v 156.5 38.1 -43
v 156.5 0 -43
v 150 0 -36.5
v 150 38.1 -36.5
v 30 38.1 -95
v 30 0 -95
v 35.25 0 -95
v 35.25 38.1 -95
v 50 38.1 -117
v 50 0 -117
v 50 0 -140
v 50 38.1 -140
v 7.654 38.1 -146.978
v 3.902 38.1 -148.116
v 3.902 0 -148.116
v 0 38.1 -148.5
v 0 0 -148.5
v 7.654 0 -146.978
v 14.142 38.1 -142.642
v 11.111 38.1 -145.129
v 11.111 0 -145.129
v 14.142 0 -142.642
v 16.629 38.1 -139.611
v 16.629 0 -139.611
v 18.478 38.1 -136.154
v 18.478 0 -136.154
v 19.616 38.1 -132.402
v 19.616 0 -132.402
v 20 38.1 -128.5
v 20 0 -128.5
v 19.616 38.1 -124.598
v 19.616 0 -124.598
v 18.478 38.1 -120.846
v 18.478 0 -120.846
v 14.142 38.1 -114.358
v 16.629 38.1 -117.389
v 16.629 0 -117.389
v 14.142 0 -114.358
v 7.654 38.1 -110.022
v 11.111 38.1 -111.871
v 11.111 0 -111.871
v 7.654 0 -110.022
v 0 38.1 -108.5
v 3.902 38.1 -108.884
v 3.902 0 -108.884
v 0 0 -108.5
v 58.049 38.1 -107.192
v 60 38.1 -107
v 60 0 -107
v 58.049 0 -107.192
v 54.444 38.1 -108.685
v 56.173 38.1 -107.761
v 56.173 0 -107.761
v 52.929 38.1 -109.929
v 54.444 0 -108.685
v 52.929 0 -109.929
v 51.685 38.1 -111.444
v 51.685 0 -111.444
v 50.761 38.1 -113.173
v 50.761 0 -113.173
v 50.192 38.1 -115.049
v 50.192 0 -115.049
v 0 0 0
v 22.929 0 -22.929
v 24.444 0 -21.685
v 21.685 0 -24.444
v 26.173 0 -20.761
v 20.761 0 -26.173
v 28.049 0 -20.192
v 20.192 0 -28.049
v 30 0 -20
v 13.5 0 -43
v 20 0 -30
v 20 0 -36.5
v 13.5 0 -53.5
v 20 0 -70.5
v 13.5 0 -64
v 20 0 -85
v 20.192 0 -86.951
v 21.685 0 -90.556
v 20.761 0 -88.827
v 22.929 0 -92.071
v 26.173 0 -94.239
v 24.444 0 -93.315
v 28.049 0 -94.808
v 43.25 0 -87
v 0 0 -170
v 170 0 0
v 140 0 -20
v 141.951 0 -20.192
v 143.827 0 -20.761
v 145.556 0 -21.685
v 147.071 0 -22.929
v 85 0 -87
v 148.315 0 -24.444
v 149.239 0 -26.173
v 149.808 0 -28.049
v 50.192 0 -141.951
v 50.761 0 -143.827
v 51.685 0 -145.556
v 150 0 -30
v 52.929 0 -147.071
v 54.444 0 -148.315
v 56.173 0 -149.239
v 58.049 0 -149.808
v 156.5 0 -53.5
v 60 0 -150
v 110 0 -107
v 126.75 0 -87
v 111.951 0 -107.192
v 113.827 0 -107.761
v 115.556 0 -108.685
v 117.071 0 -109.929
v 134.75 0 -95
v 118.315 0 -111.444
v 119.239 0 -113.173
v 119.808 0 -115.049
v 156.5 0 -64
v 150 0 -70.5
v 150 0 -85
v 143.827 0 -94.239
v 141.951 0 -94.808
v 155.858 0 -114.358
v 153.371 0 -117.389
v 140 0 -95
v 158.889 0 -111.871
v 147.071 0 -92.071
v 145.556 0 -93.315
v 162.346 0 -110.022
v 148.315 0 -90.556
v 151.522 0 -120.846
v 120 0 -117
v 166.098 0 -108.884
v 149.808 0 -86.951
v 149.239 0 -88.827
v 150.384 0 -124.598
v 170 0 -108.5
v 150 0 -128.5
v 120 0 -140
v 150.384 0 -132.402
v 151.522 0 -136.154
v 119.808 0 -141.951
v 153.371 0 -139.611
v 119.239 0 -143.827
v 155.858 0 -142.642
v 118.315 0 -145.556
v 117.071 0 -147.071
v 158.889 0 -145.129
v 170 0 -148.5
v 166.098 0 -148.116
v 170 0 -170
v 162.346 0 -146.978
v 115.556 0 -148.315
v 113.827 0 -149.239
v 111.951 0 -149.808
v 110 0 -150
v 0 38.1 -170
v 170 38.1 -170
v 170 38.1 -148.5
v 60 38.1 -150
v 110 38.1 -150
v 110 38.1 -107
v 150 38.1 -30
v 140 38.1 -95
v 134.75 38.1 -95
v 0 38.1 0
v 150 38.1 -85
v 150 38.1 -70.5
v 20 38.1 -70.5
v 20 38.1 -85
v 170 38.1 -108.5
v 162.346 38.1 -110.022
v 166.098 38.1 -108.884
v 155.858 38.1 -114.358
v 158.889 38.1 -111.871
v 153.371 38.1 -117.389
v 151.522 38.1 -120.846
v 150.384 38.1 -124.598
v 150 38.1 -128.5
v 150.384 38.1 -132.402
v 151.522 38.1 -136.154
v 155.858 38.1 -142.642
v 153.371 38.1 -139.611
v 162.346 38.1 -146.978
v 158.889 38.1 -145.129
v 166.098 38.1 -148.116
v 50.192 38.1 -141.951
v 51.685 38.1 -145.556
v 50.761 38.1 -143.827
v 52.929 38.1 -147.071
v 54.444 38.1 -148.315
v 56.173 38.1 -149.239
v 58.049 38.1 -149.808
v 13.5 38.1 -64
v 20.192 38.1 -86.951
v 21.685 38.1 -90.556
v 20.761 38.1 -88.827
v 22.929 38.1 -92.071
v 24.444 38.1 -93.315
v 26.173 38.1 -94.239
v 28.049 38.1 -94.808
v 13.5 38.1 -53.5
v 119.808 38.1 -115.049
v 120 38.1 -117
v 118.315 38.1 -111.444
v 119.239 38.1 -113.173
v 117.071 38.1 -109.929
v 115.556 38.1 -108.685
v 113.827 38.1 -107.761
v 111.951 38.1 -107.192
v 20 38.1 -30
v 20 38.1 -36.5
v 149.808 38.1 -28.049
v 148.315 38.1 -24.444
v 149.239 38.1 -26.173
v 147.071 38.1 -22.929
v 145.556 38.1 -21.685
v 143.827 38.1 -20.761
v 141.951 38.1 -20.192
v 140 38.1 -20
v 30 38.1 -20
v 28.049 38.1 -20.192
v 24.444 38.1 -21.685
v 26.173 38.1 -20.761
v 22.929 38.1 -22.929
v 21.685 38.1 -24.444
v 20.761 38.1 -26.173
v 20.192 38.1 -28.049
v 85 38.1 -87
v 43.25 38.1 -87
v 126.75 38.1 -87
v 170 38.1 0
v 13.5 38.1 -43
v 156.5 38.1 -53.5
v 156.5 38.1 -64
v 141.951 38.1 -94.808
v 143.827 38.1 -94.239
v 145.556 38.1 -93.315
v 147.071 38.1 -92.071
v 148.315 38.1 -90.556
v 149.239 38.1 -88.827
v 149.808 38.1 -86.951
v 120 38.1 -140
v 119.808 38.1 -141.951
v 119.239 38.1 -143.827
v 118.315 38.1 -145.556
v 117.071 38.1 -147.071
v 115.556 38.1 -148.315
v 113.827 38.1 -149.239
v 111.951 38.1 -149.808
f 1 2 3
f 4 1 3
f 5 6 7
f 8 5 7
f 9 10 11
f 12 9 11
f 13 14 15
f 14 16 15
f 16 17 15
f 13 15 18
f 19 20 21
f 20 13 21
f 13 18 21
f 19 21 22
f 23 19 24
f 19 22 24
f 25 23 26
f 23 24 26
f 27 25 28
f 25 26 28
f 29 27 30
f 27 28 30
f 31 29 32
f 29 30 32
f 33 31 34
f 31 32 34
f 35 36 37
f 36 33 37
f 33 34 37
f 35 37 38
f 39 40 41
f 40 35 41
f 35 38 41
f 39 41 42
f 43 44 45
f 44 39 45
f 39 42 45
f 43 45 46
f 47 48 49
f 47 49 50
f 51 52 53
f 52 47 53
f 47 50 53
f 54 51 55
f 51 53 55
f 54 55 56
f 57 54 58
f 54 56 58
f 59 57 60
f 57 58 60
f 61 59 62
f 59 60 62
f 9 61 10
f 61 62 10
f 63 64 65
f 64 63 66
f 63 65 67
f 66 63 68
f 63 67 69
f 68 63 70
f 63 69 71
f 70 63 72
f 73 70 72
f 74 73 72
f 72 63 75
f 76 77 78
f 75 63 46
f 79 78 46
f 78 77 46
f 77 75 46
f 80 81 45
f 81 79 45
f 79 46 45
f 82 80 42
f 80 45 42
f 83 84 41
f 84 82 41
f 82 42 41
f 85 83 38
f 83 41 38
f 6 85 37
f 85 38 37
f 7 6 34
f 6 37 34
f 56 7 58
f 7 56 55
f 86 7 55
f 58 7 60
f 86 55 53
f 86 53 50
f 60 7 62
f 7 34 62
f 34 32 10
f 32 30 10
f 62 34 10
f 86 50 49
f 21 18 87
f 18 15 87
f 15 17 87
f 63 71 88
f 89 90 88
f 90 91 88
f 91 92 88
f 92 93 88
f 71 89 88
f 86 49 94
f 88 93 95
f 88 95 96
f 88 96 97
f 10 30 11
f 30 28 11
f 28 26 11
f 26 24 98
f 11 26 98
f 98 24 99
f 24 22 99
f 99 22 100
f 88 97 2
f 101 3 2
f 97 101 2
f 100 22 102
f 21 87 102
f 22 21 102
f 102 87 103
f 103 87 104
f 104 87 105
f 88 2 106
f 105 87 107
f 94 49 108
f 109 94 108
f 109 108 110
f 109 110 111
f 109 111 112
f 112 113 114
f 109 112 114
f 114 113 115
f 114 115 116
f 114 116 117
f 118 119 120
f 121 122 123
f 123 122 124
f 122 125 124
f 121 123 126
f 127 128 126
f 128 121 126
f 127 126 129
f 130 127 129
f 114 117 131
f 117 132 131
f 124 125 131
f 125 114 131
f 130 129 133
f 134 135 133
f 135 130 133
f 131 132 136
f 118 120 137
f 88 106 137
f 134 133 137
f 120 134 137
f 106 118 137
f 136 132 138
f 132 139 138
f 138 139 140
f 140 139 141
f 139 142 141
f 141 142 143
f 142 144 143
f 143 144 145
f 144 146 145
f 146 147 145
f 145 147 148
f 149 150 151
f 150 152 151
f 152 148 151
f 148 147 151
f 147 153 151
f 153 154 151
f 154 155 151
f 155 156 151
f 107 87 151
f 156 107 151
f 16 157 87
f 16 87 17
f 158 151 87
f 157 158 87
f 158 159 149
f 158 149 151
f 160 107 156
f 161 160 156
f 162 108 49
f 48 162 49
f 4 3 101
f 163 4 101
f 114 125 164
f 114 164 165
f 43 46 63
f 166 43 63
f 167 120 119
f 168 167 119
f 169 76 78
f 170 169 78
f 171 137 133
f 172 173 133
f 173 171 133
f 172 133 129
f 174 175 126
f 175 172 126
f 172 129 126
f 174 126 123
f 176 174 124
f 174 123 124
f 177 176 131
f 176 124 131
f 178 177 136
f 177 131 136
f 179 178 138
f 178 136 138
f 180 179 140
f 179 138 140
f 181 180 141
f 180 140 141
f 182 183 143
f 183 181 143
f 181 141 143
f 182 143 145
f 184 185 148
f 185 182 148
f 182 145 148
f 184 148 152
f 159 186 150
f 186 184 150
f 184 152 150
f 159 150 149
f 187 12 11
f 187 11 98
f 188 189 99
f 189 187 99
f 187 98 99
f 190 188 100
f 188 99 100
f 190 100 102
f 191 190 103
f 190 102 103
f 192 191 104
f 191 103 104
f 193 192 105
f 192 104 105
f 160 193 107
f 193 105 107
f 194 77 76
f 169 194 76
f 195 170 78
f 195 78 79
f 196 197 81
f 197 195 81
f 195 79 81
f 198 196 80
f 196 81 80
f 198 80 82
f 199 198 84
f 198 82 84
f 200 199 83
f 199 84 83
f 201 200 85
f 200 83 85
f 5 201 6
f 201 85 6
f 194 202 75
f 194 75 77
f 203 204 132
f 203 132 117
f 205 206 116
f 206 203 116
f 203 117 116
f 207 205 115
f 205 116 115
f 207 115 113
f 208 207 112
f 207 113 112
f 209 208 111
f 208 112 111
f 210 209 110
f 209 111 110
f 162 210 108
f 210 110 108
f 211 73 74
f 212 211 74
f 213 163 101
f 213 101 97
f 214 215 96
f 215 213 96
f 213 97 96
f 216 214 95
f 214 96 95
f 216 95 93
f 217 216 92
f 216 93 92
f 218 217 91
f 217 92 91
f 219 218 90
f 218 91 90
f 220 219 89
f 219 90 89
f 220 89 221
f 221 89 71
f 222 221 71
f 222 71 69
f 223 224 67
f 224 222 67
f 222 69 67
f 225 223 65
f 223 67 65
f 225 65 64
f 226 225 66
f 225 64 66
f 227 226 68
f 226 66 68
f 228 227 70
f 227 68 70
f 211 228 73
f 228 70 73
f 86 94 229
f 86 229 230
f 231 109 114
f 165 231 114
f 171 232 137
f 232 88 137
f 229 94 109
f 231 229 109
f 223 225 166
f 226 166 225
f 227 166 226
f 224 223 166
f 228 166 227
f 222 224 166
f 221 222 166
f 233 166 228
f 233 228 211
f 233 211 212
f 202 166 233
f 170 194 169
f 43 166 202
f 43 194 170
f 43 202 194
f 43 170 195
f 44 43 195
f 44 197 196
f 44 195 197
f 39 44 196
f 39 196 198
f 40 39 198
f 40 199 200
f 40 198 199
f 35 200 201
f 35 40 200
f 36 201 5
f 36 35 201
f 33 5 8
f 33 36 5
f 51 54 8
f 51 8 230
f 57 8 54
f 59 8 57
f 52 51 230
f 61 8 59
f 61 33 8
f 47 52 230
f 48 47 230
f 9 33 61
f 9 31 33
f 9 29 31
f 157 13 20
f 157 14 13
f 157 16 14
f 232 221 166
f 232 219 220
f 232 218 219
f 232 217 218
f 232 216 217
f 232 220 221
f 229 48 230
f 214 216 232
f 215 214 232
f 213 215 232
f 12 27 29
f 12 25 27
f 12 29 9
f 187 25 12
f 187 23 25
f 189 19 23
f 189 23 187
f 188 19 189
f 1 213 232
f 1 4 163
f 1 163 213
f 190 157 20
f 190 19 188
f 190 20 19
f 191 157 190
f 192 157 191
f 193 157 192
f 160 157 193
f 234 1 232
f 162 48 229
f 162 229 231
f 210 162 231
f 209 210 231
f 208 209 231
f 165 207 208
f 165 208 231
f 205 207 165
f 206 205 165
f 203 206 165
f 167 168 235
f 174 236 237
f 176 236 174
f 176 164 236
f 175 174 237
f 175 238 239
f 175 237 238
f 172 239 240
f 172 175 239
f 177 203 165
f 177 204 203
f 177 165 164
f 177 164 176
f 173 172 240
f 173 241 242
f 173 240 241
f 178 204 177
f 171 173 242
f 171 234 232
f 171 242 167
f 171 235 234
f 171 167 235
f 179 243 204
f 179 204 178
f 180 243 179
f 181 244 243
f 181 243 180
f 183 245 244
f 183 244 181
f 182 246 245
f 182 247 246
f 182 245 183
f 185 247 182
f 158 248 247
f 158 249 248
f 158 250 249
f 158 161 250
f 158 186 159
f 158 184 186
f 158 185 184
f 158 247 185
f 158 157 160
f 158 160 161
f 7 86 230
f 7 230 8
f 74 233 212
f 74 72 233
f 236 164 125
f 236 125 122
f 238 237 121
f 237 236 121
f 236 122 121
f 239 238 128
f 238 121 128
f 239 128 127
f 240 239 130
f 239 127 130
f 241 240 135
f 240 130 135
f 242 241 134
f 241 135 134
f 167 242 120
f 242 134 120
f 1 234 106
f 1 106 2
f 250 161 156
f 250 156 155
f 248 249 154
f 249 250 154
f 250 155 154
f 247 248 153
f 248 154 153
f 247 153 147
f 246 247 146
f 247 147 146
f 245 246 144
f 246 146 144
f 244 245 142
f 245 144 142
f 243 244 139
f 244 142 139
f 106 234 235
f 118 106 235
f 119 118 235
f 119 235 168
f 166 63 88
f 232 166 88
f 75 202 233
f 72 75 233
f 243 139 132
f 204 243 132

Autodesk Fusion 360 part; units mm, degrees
sketch "Sketch1" plane through (0, 0, 0) normal (0, 1, 0) x (1, 0, 0)
  line L0 (0, 0) -> (170, 0)
  line L1 (170, 0) -> (170, 170)
  line L2 (170, 170) -> (0, 170)
  line L3 (0, 170) -> (0, 0)
  line L4 (85, 170) -> (85, 128.5) construction
  line L5 (110, 107) -> (60, 107)
  line L6 (50, 117) -> (50, 140)
  line L7 (60, 150) -> (110, 150)
  line L8 (120, 140) -> (120, 117)
  line L9 (120, 107) -> (50, 150) construction
  line L10 (50, 107) -> (120, 150) construction
  arc A0 (60, 150) -> (50, 140) centre (60, 140) ccw
  arc A1 (120, 140) -> (110, 150) centre (110, 140) ccw
  arc A2 (110, 107) -> (120, 117) centre (110, 117) ccw
  arc A3 (50, 117) -> (60, 107) centre (60, 117) ccw
  line L11 (85, 128.5) -> (0, 128.5) construction
  line L12 (85, 128.5) -> (170, 128.5) construction
  arc A4 (0, 108.5) -> (0, 148.5) centre (0, 128.5) ccw
  arc A5 (170, 148.5) -> (170, 108.5) centre (170, 128.5) ccw
  line L13 (85, 0) -> (85, 53.5) construction
  line L14 (140, 20) -> (30, 20)
  line L15 (20, 30) -> (20, 87)
  line L16 (150, 87) -> (150, 30)
  line L17 (150, 20) -> (20, 87) construction
  line L18 (20, 20) -> (150, 87) construction
  arc A6 (20, 30) -> (30, 20) centre (30, 30) ccw
  arc A7 (140, 20) -> (150, 30) centre (140, 30) ccw
  line L19 (85, 53.5) -> (20, 53.5) construction
  line L20 (85, 53.5) -> (150, 53.5) construction
  line L21 (20, 53.5) -> (13.5, 53.5) construction
  line L22 (13.5, 53.5) -> (13.5, 64)
  line L23 (13.5, 53.5) -> (13.5, 43)
  line L24 (13.5, 43) -> (13.5, 36.5) construction
  line L25 (13.5, 36.5) -> (20, 36.5) construction
  line L26 (13.5, 64) -> (13.5, 70.5) construction
  line L27 (13.5, 70.5) -> (20, 70.5) construction
  line L28 (13.5, 64) -> (20, 70.5)
  line L29 (13.5, 43) -> (20, 36.5)
  line L30 (156.5, 64) -> (150, 70.5)
  line L31 (156.5, 53.5) -> (156.5, 64)
  line L32 (156.5, 53.5) -> (156.5, 43)
  line L33 (156.5, 43) -> (150, 36.5)
  line L34 (85, 53.5) -> (85, 87) construction
  line L35 (85, 128.5) -> (85, 87) construction
  line L36 (85, 87) -> (43.25, 87)
  line L37 (43.25, 87) -> (35.25, 95)
  line L38 (30, 95) -> (35.25, 95)
  line L39 (35.25, 95) -> (35.25, 87) construction
  line L40 (35.25, 87) -> (43.25, 87) construction
  line L41 (30, 95) -> (30, 85) construction
  arc A8 (30, 95) -> (20, 85) centre (30, 85) ccw
  line L42 (30, 85) -> (30, 95) construction
  line L43 (30, 85) -> (20, 85) construction
  arc A9 (150, 85) -> (140, 95) centre (140, 85) ccw
  line L44 (140, 95) -> (134.75, 95)
  line L45 (126.75, 87) -> (134.75, 95)
  line L46 (85, 87) -> (126.75, 87)
  point P0 (85, 128.5)
  point P1 (85, 53.5)
  dimension "d1" = 170
  dimension "d2" = 170
  dimension "d19" = 41.5
  dimension "d20" = 70
  dimension "d21" = 43
  dimension "d22" = 10
  dimension "d23" = 10
  dimension "d24" = 10
  dimension "d25" = 10
  dimension "d26" = 20
  dimension "d27" = 20
  dimension "d28" = 53.5
  dimension "d29" = 130
  dimension "d30" = 67
  dimension "d31" = 10
  dimension "d32" = 10
  dimension "d33" = 6.5
  dimension "d34" = 10.5
  dimension "d35" = 10.5
  dimension "d36" = 6.5
  dimension "d37" = 6.5
  dimension "d41" = 41.5
  dimension "d42" = 33.5
  dimension "d44" = 41.75
  dimension "d48" = 5.25
  dimension "d49" = 135
  dimension "d50" = 8
  dimension "d51" = 10
  dimension "d52" = 90
  dimension "d53" = 135
  dimension "d54" = 8
extrude "Extrude1" add sketch "Sketch1" along normal blind 38.1 contours L0 L1 L2 L3 A4 A5
